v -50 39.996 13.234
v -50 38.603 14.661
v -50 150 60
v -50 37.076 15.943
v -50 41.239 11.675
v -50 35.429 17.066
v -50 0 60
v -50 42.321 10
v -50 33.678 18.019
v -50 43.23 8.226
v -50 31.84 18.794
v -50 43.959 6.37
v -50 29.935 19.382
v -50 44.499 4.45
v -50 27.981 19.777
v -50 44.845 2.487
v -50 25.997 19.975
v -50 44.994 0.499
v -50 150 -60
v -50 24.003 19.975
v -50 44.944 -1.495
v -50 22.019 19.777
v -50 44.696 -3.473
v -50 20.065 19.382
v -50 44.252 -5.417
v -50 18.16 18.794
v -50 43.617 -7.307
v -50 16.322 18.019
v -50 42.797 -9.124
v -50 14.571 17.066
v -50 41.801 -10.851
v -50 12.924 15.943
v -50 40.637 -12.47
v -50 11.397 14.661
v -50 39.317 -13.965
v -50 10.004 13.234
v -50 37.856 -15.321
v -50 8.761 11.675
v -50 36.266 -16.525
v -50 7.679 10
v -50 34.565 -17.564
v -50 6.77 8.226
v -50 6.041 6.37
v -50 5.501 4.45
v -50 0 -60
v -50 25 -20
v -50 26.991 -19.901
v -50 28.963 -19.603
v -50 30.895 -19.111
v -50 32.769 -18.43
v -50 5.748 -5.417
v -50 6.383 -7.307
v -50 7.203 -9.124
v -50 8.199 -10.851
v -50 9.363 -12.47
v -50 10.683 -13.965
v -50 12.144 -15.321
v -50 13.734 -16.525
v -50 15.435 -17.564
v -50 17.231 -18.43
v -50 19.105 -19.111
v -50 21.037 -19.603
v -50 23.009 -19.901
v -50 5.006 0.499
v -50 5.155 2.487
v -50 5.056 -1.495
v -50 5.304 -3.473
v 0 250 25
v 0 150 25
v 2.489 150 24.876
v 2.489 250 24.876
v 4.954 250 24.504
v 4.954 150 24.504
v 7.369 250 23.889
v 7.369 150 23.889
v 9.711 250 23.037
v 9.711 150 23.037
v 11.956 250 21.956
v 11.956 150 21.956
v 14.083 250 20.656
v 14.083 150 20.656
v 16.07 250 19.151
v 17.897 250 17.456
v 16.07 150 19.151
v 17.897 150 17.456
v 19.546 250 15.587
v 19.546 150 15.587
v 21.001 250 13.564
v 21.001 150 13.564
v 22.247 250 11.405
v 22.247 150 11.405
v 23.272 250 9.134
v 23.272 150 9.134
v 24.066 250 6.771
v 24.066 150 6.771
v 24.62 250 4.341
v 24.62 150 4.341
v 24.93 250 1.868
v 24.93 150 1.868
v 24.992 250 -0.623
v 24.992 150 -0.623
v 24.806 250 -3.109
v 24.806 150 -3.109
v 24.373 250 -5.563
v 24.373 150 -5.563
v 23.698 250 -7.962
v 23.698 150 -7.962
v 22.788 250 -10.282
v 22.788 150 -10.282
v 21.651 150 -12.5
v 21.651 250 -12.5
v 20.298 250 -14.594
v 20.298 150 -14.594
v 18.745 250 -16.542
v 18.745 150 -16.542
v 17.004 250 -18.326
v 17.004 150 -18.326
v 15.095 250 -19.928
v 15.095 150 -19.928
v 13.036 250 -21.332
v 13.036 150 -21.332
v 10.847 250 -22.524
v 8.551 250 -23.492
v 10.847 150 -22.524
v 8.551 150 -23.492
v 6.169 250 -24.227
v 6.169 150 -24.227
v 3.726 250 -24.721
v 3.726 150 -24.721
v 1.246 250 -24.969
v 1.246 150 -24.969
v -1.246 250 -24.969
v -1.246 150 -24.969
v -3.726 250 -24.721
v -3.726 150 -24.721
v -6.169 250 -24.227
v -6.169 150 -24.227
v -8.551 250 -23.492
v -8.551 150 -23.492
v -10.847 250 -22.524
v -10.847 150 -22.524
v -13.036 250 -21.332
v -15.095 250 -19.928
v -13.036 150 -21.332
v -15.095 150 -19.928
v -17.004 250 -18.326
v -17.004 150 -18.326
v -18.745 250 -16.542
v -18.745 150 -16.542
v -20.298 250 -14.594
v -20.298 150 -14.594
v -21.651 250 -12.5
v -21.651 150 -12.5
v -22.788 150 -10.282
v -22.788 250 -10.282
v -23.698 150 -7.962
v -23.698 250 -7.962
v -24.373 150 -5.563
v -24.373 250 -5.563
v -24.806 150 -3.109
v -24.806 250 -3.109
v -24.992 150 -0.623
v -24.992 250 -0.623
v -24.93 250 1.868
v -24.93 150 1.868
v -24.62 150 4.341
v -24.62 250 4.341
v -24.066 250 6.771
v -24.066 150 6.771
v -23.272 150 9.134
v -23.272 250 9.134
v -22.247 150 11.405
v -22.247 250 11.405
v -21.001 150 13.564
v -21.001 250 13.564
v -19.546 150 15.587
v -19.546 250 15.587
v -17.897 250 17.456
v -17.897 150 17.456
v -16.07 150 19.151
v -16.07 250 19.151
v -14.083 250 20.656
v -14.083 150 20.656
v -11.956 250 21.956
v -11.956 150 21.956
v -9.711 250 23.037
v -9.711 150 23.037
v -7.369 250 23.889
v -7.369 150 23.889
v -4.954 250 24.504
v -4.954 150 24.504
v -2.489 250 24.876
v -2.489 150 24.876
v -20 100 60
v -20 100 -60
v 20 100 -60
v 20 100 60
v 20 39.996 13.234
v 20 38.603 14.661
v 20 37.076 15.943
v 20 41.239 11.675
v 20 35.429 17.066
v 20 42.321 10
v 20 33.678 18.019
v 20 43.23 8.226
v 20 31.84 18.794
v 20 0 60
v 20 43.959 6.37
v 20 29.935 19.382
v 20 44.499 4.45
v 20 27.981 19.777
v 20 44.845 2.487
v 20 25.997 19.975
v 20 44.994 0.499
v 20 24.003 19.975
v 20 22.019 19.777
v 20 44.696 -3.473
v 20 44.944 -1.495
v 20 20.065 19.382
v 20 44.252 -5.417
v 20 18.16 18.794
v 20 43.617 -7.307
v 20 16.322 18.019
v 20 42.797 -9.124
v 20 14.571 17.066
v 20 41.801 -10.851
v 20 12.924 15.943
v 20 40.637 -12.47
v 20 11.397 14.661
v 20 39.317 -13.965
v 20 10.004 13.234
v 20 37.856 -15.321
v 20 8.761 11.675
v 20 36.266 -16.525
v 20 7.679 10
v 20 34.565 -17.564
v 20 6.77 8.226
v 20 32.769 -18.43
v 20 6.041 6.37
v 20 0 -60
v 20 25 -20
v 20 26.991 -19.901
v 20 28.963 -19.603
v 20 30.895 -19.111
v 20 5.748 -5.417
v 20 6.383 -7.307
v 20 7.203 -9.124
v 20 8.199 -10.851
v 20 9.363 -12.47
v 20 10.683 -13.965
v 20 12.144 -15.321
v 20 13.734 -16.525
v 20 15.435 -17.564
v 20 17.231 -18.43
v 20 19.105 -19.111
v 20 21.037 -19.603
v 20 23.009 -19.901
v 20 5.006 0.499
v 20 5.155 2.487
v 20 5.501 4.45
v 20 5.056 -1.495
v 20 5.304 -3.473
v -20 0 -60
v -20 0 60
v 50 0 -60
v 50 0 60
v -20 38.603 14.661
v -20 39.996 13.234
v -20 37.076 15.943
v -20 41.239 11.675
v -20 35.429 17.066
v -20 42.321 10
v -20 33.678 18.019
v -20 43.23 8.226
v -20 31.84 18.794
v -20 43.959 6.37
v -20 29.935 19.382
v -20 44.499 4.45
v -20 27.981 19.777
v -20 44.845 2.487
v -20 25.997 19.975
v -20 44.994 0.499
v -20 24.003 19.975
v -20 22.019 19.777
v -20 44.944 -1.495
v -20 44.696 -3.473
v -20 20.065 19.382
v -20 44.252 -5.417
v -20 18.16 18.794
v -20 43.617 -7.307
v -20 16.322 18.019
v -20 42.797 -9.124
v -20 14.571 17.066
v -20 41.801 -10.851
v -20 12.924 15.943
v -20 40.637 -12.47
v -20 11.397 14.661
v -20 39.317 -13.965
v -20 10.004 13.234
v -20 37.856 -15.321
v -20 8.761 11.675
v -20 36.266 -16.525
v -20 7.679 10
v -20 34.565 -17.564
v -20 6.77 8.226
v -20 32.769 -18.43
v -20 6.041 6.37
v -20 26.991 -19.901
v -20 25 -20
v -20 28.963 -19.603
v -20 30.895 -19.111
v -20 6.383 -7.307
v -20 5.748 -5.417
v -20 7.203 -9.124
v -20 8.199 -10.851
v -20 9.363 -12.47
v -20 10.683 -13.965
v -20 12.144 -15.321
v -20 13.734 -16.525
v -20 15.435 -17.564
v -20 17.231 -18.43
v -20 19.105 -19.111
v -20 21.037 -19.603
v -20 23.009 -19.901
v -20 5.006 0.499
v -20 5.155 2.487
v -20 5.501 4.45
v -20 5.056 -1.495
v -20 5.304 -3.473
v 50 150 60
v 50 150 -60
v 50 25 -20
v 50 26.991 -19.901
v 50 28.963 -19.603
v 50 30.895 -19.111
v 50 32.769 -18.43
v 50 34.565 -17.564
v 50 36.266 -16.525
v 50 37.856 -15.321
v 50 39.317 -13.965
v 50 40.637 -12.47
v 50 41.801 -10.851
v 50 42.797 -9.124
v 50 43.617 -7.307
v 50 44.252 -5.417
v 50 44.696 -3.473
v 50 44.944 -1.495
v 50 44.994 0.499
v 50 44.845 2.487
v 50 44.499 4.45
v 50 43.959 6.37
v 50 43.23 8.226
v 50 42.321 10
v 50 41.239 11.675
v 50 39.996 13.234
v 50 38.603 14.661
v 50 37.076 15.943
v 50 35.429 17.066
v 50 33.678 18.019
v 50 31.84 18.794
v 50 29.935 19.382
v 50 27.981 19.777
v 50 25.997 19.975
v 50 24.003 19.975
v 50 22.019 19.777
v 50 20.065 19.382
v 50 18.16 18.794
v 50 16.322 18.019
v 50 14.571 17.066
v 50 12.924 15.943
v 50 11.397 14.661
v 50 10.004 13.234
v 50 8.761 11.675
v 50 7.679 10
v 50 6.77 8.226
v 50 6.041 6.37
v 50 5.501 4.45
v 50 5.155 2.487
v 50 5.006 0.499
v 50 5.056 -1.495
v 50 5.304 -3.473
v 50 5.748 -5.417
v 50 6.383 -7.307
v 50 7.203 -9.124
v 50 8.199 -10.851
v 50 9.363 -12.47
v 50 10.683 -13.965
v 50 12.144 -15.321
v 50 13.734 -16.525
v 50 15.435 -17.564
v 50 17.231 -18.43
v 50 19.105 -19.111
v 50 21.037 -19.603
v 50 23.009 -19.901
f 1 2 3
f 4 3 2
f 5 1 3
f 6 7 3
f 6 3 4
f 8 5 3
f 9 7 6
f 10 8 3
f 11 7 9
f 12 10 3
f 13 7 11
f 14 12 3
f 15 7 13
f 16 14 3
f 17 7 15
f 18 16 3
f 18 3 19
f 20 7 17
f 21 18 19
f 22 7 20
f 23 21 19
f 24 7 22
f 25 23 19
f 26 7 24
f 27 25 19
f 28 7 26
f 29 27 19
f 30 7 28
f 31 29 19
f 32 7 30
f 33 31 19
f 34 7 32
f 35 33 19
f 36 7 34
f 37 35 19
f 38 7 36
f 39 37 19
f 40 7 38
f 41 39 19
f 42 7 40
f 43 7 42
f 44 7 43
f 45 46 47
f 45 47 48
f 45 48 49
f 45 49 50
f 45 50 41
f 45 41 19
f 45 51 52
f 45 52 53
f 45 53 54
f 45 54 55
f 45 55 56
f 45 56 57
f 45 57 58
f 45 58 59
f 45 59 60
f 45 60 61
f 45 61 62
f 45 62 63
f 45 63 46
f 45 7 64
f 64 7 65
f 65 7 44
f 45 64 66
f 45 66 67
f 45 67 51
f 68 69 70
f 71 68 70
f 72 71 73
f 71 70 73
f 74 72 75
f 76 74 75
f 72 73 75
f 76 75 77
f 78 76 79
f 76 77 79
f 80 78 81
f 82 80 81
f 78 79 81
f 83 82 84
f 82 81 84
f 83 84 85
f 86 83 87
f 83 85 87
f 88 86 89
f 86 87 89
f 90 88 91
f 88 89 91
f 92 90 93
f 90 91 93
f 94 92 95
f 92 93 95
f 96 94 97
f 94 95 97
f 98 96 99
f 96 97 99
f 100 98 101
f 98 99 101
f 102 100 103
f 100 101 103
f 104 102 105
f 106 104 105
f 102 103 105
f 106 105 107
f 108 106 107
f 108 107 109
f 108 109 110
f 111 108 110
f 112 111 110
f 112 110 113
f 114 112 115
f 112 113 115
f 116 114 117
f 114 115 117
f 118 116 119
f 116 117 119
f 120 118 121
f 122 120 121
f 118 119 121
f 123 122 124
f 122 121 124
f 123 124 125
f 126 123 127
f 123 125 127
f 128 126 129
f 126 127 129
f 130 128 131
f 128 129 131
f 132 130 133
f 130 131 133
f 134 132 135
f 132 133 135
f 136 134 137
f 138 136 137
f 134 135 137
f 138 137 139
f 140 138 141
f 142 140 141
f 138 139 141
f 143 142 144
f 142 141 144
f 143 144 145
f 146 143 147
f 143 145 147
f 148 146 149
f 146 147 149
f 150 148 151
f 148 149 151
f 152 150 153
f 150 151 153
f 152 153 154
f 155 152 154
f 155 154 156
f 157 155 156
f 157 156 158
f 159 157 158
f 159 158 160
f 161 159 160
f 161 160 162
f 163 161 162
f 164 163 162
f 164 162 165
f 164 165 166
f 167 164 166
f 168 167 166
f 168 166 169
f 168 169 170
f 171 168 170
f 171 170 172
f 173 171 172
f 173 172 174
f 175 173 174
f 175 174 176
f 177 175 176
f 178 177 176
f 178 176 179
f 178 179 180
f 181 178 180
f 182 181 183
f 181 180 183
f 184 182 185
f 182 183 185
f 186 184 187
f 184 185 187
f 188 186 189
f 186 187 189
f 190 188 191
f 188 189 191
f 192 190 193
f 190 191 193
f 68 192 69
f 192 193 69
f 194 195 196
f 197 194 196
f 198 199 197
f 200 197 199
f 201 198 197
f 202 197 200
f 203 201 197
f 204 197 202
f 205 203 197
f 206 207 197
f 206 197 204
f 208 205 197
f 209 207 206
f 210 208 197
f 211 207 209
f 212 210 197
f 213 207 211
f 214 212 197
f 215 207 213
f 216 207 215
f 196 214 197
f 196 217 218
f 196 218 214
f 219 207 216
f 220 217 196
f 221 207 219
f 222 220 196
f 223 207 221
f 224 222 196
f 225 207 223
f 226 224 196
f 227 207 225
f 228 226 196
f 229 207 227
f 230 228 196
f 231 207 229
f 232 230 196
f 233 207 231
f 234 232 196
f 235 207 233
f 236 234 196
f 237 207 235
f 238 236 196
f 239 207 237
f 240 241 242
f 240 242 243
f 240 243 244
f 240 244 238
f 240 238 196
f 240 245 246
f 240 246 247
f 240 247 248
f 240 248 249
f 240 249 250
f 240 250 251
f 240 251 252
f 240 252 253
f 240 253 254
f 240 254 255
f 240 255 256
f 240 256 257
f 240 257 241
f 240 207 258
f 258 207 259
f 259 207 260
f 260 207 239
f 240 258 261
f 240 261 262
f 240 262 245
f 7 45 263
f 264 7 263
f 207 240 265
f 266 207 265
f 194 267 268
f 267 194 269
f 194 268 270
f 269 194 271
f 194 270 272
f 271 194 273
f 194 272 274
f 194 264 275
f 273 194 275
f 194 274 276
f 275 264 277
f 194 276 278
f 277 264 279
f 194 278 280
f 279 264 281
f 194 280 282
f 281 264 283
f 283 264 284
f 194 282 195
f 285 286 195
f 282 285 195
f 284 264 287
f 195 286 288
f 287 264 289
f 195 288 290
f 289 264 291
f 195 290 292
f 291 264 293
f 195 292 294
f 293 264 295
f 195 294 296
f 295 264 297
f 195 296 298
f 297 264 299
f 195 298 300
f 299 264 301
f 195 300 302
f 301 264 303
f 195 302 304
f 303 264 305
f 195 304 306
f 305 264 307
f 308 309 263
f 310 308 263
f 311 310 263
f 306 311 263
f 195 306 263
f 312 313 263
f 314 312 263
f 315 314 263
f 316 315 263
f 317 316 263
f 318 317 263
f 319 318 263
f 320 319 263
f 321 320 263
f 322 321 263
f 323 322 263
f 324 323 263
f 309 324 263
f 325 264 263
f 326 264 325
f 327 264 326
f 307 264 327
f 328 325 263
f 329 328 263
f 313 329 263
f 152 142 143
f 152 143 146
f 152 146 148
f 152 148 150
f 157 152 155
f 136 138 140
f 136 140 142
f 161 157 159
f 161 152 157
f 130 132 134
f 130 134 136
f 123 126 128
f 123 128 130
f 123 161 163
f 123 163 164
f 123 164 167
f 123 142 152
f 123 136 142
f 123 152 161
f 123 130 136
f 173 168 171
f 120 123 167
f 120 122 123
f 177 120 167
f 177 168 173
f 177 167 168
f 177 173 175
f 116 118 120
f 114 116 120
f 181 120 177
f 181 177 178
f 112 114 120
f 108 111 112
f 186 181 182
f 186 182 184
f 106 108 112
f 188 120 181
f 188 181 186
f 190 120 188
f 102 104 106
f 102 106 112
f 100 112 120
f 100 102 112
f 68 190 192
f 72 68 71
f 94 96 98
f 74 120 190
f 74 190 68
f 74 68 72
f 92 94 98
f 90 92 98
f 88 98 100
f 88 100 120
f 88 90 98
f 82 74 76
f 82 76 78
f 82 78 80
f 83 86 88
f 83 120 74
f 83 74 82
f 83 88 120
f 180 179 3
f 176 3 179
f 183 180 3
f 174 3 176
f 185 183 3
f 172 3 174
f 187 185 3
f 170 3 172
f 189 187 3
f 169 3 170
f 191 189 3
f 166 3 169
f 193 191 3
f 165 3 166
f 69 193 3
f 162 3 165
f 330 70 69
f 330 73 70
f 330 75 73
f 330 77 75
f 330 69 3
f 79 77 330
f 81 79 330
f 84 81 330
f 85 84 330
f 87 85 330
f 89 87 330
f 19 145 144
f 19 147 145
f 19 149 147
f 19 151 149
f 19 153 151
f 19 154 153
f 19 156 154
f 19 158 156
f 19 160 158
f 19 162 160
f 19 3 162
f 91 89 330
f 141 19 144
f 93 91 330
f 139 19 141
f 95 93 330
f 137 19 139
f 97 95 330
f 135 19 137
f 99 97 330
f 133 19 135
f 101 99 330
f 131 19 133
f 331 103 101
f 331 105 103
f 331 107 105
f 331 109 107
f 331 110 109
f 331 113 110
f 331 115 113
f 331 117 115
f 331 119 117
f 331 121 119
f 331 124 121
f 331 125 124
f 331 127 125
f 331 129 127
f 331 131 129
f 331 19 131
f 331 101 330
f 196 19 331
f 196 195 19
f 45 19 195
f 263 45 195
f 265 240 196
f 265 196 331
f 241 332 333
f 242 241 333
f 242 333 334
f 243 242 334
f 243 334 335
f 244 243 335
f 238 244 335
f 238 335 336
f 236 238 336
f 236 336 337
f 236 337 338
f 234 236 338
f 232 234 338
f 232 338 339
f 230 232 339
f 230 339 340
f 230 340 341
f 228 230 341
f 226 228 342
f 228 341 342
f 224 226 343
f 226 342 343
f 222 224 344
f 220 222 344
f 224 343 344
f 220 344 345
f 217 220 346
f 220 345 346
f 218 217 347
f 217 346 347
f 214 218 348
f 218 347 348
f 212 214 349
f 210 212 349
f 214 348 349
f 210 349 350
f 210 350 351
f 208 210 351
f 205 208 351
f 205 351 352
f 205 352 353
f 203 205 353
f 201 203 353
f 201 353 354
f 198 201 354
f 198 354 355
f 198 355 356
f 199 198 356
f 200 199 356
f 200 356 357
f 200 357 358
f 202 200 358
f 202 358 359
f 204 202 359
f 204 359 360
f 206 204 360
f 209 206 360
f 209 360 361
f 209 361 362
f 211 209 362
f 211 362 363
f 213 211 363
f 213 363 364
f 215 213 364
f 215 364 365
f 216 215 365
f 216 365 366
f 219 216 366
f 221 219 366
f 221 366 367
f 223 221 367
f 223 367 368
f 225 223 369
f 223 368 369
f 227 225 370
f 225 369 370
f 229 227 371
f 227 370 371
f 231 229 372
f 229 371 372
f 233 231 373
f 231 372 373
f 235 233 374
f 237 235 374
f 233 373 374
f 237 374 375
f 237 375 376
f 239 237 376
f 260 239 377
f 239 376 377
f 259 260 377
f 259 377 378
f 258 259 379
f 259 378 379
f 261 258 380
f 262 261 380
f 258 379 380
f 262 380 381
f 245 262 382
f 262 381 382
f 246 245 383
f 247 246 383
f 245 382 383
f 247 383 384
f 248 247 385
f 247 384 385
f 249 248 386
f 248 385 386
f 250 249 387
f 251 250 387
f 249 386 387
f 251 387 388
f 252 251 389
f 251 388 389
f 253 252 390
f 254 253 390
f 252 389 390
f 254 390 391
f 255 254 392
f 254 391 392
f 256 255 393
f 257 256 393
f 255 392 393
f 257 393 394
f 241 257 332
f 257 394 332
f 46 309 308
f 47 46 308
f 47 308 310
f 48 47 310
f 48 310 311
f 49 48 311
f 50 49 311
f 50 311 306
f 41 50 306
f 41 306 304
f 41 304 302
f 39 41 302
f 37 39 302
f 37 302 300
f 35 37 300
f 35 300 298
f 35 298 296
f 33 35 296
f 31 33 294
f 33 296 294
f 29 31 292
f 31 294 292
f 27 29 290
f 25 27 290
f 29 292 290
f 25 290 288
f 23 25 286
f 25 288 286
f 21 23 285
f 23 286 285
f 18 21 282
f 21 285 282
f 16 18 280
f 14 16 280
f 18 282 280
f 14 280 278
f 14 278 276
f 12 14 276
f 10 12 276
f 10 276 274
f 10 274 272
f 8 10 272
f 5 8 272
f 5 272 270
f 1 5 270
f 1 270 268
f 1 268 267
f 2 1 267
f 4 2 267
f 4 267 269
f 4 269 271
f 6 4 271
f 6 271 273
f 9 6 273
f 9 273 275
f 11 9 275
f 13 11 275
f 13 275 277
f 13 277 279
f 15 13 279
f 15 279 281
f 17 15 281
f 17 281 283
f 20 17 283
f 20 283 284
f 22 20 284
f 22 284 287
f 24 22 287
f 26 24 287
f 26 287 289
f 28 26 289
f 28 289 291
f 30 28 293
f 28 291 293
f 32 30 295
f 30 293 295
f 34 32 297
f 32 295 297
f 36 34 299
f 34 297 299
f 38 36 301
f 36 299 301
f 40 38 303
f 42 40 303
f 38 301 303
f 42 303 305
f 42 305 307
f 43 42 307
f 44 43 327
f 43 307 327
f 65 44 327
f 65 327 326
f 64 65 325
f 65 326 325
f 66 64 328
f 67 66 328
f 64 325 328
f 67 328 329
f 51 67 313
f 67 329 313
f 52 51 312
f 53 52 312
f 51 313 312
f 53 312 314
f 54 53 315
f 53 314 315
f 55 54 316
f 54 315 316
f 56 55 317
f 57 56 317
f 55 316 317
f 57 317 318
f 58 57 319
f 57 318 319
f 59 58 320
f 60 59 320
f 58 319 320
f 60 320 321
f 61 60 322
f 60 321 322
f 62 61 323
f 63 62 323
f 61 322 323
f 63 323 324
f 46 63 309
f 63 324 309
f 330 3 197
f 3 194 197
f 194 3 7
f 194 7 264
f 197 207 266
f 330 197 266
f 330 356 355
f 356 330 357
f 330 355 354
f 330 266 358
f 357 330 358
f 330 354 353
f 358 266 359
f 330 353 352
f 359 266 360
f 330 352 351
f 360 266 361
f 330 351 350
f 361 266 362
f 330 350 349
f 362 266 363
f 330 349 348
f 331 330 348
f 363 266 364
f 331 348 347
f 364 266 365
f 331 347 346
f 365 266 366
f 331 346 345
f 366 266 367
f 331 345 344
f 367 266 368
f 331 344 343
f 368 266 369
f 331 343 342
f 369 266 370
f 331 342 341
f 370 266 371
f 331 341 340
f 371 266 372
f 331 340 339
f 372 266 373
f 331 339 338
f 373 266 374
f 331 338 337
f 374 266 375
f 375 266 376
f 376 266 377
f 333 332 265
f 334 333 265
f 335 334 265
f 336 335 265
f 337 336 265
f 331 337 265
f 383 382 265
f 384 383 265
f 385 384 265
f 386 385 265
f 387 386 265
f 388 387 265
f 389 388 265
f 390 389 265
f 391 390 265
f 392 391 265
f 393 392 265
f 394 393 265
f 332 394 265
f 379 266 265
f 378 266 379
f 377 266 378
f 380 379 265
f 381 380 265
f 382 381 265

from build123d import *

# Parameters (mm, degrees)
SKETCH1_W             = 30
SKETCH1_H             = 120
BOSS_EXTRUDE1_DEPTH   = 100
BOSS_EXTRUDE1_2_DEPTH = 100
SKETCH2_R             = 20
CUT_EXTRUDE1_DEPTH    = 150
SKETCH3_W             = 100
SKETCH3_H             = 120
BOSS_EXTRUDE2_DEPTH   = 50
SKETCH4_R             = 25
BOSS_EXTRUDE3_DEPTH   = 100


with BuildPart() as part:
    # Sketch1 → Boss-Extrude1 (new body)
    with BuildSketch(Plane(origin=(0, 0, 0), x_dir=(1, 0, 0), z_dir=(0, 1, 0))):
        with Locations((-35, 0)):
            Rectangle(SKETCH1_W, SKETCH1_H)
    extrude(amount=BOSS_EXTRUDE1_DEPTH)


with BuildPart() as body_2:
    # Sketch1 → Boss-Extrude1 2 (new body)
    with BuildSketch(Plane(origin=(0, 0, 0), x_dir=(1, 0, 0), z_dir=(0, 1, 0))):
        with Locations((35, 0)):
            Rectangle(SKETCH1_W, SKETCH1_H)
    extrude(amount=BOSS_EXTRUDE1_2_DEPTH)


with BuildPart() as cut_extrude1_tool:
    # Sketch2 → Cut-Extrude1 (new body)
    with BuildSketch(Plane(origin=(50, 0, 0), x_dir=(0, 0, -1), z_dir=(1, 0, 0))):
        with Locations((0, 25)):
            Circle(SKETCH2_R)
    extrude(amount=-CUT_EXTRUDE1_DEPTH)


with BuildPart() as part_1:
    add(part.part)

    # Cut-Extrude1: cut by cut_extrude1_tool
    add(cut_extrude1_tool.part, mode=Mode.SUBTRACT)



with BuildPart() as body_2_1:
    add(body_2.part)

    # Cut-Extrude1: cut by cut_extrude1_tool
    add(cut_extrude1_tool.part, mode=Mode.SUBTRACT)


with BuildPart() as part_2:
    add(part_1.part)

    add(body_2_1.part)  # Boss-Extrude2 merges body 2
    # Sketch3 → Boss-Extrude2 (add)
    with BuildSketch(Plane(origin=(0, 100, 0), x_dir=(1, 0, 0), z_dir=(0, 1, 0))):
        Rectangle(SKETCH3_W, SKETCH3_H)
    extrude(amount=BOSS_EXTRUDE2_DEPTH)

    # Sketch4 → Boss-Extrude3 (add)
    with BuildSketch(Plane(origin=(0, 150, 0), x_dir=(1, 0, 0), z_dir=(0, 1, 0))):
        with Locations(Location((0, 0, 0), (0, 0, 270))):
            Circle(SKETCH4_R)
    extrude(amount=BOSS_EXTRUDE3_DEPTH)


solid = part_2.part
